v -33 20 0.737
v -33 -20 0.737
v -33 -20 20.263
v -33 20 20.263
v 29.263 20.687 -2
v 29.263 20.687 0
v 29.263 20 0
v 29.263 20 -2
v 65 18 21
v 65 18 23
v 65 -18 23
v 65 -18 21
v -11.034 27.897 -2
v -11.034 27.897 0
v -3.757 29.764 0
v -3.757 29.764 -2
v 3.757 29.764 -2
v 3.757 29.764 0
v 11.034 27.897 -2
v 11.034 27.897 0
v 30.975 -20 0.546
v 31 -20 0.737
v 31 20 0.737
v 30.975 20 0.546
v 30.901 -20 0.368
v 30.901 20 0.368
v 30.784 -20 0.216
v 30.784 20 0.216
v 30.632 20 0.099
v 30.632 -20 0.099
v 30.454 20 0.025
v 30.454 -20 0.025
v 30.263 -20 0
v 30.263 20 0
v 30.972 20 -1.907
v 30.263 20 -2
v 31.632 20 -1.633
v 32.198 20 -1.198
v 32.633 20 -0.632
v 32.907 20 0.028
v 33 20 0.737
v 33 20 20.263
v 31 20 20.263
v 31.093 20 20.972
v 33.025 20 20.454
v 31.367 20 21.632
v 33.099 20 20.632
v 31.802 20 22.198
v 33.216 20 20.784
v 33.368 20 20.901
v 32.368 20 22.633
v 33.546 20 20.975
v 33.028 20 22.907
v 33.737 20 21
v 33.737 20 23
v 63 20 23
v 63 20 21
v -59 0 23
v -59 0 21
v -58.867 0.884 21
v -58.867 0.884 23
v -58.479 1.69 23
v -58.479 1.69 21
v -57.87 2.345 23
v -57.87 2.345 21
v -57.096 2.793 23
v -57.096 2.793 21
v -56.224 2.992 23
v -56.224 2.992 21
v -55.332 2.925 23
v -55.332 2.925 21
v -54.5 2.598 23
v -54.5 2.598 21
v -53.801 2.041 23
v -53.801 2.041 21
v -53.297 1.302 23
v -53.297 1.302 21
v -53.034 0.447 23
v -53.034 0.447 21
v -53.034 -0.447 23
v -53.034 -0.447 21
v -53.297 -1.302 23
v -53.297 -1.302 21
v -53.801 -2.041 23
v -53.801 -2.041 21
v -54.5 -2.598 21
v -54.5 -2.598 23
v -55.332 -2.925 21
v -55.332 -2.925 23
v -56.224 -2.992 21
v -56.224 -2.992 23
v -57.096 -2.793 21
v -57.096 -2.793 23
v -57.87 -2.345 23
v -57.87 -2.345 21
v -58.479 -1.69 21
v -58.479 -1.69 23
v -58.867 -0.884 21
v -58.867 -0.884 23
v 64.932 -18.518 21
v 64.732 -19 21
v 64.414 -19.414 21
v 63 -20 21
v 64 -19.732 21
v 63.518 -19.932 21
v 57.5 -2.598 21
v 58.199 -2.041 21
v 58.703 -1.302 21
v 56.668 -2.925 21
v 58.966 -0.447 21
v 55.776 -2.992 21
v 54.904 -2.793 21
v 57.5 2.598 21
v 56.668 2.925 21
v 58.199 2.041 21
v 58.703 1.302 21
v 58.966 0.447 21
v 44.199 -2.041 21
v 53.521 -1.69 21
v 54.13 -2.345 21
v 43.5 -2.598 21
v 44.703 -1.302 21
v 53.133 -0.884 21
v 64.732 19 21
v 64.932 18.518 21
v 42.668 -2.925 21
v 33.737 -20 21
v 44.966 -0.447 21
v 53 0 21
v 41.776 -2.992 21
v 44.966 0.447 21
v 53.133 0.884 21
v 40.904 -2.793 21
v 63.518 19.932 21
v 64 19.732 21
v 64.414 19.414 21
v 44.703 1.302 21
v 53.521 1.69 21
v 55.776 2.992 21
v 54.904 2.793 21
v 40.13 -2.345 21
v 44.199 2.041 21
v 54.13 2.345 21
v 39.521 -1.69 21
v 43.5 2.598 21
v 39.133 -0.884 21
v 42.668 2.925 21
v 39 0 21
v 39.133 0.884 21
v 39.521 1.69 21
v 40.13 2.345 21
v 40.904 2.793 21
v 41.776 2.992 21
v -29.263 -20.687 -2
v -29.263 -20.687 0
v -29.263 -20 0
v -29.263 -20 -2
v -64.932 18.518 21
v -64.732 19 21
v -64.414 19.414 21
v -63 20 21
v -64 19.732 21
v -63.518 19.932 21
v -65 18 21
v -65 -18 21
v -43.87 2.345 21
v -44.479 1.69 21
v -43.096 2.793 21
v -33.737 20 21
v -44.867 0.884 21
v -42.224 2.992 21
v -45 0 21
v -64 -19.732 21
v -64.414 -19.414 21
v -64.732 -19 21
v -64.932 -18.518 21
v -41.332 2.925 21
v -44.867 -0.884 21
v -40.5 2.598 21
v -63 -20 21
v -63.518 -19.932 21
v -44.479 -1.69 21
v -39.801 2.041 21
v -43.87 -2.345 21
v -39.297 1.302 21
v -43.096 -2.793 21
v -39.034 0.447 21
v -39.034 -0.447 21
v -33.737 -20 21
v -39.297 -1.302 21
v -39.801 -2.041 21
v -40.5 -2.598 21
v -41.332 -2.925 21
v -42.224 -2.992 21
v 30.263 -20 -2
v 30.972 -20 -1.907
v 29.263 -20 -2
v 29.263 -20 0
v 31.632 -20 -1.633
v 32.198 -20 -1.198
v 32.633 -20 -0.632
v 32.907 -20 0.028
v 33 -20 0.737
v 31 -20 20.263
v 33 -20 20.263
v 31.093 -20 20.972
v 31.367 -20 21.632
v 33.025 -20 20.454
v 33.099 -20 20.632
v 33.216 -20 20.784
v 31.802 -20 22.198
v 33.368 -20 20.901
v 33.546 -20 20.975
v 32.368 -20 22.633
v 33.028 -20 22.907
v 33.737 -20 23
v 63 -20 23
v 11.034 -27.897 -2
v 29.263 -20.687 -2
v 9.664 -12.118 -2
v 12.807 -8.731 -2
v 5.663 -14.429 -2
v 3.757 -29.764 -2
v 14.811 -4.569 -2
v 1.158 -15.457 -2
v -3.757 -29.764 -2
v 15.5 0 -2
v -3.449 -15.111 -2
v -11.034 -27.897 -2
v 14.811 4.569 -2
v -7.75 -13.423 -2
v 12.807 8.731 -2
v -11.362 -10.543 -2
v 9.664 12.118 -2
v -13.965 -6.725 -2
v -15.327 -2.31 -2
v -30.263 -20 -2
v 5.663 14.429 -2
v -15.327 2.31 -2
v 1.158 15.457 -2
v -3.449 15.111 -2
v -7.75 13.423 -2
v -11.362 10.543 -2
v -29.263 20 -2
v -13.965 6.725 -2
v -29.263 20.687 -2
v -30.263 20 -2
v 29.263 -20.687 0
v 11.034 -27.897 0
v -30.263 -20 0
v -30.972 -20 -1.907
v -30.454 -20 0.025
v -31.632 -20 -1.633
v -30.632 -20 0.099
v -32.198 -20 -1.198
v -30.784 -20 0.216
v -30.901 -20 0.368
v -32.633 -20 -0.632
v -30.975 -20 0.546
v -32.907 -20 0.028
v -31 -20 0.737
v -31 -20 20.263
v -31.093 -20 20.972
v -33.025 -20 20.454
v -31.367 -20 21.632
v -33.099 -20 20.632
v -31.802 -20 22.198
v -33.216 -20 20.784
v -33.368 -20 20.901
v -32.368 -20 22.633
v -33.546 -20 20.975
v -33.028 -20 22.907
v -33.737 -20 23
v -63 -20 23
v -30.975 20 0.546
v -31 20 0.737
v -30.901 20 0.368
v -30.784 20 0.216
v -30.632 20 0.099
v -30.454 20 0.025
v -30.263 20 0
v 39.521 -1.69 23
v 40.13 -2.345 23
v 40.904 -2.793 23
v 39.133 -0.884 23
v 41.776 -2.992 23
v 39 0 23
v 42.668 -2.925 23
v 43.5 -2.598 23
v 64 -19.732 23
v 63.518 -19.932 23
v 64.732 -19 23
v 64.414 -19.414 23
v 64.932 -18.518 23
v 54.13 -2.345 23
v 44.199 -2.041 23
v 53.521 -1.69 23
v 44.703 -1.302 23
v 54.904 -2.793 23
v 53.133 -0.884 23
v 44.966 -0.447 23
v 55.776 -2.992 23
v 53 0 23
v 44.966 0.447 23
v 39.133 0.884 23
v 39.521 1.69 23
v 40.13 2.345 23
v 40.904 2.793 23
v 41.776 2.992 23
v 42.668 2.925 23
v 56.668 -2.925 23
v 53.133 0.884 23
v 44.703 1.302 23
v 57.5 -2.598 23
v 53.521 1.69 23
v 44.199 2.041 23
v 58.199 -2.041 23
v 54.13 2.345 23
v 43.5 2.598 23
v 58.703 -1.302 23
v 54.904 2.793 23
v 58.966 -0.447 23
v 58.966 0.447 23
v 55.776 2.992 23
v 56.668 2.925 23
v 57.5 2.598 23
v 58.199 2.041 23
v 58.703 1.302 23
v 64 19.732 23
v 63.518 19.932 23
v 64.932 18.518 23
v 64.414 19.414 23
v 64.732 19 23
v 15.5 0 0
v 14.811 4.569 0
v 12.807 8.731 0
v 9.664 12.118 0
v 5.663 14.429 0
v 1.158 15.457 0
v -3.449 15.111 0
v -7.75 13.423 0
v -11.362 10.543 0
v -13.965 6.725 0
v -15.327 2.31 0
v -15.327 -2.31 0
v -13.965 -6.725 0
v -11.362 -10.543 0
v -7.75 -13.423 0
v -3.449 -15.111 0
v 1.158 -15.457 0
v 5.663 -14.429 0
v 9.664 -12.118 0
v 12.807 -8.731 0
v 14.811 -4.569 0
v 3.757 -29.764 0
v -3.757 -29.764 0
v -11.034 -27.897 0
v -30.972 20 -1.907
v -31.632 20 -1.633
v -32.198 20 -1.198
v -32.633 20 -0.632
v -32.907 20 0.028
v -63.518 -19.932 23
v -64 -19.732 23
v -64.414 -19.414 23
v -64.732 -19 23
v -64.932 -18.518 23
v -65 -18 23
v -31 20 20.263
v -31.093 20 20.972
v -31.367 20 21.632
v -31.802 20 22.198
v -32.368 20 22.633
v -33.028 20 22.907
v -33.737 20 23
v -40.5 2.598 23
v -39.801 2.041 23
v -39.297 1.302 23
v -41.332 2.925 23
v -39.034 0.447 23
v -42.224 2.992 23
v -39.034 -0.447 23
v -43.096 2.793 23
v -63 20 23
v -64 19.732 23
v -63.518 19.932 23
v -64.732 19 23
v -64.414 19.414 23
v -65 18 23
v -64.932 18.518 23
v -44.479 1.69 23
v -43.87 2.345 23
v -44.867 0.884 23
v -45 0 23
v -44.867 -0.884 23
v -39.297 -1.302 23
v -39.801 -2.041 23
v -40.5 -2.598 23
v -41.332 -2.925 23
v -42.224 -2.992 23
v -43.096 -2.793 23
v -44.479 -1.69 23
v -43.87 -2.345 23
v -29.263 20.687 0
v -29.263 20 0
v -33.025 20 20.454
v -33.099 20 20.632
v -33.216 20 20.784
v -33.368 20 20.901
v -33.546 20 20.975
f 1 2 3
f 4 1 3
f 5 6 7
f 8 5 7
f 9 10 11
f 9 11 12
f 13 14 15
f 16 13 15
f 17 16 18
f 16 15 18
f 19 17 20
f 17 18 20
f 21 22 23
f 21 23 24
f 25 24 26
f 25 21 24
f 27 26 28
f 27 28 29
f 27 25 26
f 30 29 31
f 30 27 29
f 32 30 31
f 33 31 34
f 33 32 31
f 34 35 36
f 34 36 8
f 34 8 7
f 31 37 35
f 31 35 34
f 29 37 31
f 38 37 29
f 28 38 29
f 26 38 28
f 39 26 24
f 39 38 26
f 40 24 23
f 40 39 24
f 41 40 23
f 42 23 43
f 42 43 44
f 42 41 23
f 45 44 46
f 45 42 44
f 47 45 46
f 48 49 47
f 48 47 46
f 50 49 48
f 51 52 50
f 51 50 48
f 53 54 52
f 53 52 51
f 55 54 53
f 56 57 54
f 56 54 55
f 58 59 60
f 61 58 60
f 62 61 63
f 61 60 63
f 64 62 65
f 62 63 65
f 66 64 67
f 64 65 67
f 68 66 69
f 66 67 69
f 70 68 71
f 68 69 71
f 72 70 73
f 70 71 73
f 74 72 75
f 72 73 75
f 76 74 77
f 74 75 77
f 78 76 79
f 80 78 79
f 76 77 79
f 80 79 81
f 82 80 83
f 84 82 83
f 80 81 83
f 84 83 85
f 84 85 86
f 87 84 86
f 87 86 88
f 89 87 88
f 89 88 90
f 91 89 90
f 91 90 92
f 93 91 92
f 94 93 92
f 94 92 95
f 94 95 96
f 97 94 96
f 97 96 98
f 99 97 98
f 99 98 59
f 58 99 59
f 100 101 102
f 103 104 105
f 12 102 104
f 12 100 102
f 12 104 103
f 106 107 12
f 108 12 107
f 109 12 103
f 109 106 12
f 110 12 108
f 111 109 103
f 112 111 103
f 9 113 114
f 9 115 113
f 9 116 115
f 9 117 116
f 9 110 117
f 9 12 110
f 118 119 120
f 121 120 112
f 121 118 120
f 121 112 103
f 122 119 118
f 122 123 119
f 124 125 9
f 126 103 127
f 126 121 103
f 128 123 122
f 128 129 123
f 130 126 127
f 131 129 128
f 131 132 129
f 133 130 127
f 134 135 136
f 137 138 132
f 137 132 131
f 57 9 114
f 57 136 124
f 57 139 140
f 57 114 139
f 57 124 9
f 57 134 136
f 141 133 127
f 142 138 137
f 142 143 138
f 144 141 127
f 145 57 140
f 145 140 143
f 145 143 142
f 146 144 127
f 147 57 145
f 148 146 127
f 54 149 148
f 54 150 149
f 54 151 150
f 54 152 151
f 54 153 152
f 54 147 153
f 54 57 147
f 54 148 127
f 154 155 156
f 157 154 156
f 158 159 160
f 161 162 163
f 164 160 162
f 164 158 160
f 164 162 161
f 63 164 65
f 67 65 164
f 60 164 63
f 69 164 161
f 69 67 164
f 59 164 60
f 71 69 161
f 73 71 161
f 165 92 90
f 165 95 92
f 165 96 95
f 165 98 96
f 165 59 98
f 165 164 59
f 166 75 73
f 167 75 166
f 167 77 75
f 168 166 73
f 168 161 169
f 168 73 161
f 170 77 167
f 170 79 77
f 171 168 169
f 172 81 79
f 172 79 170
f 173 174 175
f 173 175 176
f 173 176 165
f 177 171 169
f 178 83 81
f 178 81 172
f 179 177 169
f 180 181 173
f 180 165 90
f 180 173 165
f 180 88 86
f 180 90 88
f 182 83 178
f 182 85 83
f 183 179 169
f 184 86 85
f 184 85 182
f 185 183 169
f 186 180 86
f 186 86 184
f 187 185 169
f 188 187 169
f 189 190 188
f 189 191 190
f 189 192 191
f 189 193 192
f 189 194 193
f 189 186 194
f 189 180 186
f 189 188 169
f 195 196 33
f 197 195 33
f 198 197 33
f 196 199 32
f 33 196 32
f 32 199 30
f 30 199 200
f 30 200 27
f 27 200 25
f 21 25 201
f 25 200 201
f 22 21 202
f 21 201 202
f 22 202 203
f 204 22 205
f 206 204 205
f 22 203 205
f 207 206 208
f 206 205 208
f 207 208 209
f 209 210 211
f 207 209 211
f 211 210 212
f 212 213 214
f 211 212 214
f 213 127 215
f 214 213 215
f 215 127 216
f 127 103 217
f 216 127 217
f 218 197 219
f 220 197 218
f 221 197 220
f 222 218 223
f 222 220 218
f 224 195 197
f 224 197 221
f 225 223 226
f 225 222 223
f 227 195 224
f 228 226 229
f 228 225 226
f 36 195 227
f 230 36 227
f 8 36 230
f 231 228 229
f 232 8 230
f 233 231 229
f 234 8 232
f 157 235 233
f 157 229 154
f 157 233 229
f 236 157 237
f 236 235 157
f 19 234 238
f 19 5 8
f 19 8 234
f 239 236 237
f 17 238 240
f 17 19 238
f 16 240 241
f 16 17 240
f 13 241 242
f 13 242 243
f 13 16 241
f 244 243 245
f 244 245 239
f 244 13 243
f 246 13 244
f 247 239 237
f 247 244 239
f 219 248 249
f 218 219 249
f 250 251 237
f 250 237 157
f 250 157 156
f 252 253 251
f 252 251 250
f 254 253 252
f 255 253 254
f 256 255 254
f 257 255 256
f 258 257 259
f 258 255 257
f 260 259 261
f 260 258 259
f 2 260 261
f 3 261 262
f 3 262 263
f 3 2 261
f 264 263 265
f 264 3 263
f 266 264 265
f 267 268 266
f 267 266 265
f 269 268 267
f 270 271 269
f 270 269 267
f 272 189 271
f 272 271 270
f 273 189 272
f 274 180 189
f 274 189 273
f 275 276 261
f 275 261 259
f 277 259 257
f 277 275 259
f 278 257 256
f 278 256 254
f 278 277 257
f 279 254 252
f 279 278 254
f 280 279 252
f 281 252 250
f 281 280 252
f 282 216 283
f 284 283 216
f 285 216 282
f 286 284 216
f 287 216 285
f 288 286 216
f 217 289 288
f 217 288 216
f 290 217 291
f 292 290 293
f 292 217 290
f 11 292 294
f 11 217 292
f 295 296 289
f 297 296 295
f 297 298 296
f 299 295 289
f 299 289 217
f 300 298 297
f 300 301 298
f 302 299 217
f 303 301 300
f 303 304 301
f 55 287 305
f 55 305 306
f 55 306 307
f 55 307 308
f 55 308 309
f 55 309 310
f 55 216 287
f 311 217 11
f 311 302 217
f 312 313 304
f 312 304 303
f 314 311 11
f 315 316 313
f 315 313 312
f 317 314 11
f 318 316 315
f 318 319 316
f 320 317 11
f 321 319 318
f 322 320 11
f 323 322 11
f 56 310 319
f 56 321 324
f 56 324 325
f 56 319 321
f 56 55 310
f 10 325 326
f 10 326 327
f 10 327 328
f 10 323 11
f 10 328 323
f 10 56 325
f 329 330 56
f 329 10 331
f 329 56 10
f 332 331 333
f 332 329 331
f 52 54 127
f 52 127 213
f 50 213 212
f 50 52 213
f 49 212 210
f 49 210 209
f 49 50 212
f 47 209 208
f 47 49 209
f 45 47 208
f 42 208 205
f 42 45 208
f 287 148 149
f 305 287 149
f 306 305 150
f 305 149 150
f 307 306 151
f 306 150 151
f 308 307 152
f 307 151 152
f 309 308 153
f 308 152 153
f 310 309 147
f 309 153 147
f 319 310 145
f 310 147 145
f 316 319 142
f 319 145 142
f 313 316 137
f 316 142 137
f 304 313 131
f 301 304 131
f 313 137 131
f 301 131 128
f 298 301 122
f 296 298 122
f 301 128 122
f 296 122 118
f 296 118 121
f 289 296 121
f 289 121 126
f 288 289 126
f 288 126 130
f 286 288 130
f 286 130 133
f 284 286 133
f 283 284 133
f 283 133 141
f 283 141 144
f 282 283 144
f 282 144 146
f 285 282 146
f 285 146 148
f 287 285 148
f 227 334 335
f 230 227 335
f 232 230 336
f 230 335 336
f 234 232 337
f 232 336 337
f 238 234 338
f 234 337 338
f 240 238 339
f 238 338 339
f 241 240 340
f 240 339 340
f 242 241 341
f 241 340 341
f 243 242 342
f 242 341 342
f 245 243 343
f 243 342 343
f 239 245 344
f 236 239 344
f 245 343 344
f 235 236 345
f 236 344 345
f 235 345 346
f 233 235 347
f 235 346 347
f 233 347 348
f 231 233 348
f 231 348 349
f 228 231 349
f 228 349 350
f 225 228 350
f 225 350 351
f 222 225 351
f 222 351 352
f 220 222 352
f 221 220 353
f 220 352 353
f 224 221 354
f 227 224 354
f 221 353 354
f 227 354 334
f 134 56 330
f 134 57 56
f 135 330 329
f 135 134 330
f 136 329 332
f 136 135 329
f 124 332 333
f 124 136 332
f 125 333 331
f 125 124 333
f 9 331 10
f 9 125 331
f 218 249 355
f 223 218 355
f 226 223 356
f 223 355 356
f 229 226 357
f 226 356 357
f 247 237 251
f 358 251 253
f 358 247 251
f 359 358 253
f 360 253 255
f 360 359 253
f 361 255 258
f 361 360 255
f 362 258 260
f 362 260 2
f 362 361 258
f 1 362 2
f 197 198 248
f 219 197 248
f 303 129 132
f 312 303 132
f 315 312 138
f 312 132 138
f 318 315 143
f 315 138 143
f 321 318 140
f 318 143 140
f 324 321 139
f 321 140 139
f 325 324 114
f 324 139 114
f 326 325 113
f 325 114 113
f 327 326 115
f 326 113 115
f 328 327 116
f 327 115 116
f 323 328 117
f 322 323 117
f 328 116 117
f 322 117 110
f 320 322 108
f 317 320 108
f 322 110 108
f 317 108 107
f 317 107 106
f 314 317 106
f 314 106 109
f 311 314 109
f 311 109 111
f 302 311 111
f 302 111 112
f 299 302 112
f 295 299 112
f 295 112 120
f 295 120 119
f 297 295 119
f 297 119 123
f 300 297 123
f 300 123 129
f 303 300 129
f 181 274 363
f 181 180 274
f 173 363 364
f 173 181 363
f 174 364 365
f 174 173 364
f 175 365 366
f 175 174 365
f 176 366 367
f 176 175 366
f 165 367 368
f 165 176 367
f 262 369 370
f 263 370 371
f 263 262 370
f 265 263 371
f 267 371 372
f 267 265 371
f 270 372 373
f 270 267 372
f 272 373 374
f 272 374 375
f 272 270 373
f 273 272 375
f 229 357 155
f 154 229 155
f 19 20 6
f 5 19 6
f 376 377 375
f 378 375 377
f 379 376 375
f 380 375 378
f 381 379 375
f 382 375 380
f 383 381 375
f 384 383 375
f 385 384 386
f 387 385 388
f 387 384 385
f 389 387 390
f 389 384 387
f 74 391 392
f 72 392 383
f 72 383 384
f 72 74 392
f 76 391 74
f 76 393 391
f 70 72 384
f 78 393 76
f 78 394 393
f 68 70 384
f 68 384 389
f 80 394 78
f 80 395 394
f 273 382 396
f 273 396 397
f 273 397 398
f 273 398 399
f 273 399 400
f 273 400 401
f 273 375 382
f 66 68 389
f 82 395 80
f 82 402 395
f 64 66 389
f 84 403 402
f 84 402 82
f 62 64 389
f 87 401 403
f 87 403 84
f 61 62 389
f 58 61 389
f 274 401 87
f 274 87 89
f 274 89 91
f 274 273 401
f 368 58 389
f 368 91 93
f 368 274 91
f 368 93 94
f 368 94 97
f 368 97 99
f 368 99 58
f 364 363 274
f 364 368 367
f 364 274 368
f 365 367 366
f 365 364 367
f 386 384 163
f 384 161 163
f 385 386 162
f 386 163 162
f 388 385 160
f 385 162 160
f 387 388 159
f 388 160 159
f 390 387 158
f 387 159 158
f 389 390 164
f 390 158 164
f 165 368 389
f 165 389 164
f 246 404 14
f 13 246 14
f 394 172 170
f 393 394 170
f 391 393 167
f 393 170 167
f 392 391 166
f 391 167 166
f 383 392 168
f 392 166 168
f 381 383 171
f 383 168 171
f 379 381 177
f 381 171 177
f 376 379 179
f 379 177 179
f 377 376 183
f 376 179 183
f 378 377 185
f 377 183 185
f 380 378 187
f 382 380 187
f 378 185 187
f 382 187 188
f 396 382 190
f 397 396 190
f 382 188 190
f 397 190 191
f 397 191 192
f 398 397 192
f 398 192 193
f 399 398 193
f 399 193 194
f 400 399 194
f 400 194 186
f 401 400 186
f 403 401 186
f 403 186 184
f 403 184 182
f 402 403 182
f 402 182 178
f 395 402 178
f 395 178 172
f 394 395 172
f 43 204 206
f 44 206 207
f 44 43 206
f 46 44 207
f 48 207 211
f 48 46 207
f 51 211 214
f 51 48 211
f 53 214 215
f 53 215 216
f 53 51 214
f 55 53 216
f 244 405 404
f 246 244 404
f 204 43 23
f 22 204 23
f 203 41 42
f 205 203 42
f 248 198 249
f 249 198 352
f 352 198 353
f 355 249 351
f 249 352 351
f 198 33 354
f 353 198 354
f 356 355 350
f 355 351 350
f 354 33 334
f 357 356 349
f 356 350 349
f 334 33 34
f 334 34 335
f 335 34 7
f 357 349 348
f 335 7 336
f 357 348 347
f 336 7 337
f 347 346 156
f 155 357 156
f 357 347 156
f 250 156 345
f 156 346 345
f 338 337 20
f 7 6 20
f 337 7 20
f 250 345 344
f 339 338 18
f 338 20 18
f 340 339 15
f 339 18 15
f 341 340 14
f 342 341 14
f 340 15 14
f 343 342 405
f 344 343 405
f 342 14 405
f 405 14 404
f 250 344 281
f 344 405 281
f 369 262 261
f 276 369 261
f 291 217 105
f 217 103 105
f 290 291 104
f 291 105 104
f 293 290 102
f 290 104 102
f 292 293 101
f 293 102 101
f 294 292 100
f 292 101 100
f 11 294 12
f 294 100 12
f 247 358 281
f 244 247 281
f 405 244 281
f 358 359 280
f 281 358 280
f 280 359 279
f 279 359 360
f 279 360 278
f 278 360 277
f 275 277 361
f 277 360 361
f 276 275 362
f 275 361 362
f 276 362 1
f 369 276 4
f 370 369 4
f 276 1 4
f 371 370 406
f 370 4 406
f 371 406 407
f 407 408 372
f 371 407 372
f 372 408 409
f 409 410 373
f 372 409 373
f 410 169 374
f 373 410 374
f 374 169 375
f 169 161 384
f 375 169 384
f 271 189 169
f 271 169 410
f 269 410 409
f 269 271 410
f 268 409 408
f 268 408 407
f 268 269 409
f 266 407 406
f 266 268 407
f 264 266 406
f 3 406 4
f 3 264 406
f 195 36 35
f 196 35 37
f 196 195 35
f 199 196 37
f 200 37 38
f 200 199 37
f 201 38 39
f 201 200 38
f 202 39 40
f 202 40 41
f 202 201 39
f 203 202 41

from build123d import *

# Parameters (mm, degrees)
SKETCH1_R                       = 15.5
BASE_FLANGE1_DEPTH              = 2
EDGE_FLANGE1_STRIP_W            = 9.4732
EDGE_FLANGE1_STRIP_H            = 2
EDGE_FLANGE1_STRIP_CUT_DEPTH    = 40
EDGE_FLANGE1_RELIEF_W           = 10.4732
EDGE_FLANGE1_RELIEF_H           = 1
EDGE_FLANGE1_RELIEF_CUT_DEPTH   = 2
EDGE_FLANGE1_STRIP_2_W          = 9.4732
EDGE_FLANGE1_STRIP_2_H          = 2
EDGE_FLANGE1_STRIP_CUT_2_DEPTH  = 40
EDGE_FLANGE1_RELIEF_2_W         = 10.4732
EDGE_FLANGE1_RELIEF_2_H         = 1
EDGE_FLANGE1_RELIEF_CUT_2_DEPTH = 2
EDGE_FLANGE1_DEPTH              = 40
EDGE_FLANGE1_BEND_DEPTH         = 40
EDGE_FLANGE2_STRIP_W            = 9.4732
EDGE_FLANGE2_STRIP_H            = 2
EDGE_FLANGE2_STRIP_CUT_DEPTH    = 40
EDGE_FLANGE2_STRIP_2_W          = 9.4732
EDGE_FLANGE2_STRIP_2_H          = 2
EDGE_FLANGE2_STRIP_CUT_2_DEPTH  = 40
EDGE_FLANGE2_DEPTH              = 40
EDGE_FLANGE2_BEND_DEPTH         = 40
SKETCH17_R                      = 3
CUT_EXTRUDE1_DEPTH              = 10
FILLET1_R                       = 2


# Sheet-metal steps are written as plain solids
with BuildPart() as part:
    # Sketch1 → Base-Flange1 (new body)
    with BuildSketch(Plane.XY):
        with BuildLine():
            Line((-31, 20), (-11.034132012, 27.897095382))
            ThreePointArc((-11.034132012, 27.897095382), (0, 30), (11.034132012, 27.897095382))
            Line((11.034132012, 27.897095382), (31, 20))
            Line((31, 20), (31, -20))
            Line((31, -20), (11.034132012, -27.897095382))
            ThreePointArc((11.034132012, -27.897095382), (0, -30), (-11.034132012, -27.897095382))
            Line((-11.034132012, -27.897095382), (-31, -20))
            Line((-31, -20), (-31, 20))
        make_face()
        Circle(SKETCH1_R, mode=Mode.SUBTRACT)
    extrude(amount=-BASE_FLANGE1_DEPTH)

    # Edge-Flange1 strip (across the edge) → Edge-Flange1 strip cut (cut)
    with BuildSketch(Plane(origin=(-31, 20, 0), x_dir=(1, 0, 0), z_dir=(0, -1, 0))):
        with Locations((-4, -1)):
            Rectangle(EDGE_FLANGE1_STRIP_W, EDGE_FLANGE1_STRIP_H)
    extrude(amount=EDGE_FLANGE1_STRIP_CUT_DEPTH, mode=Mode.SUBTRACT)

    # Edge-Flange1 relief (on the sheet) → Edge-Flange1 relief cut (cut)
    with BuildSketch(Plane(origin=(-30.2634, 20, 0), x_dir=(1, 0, 0), z_dir=(0, 0, 1))):
        with Locations((-4.2366, 0.5)):
            Rectangle(EDGE_FLANGE1_RELIEF_W, EDGE_FLANGE1_RELIEF_H)
        with Locations((-4.2366, -40.5)):
            Rectangle(EDGE_FLANGE1_RELIEF_W, EDGE_FLANGE1_RELIEF_H)
    extrude(amount=-EDGE_FLANGE1_RELIEF_CUT_DEPTH, mode=Mode.SUBTRACT)

    # Edge-Flange1 strip 2 (across the edge) → Edge-Flange1 strip cut 2 (cut)
    with BuildSketch(Plane(origin=(31, -20, 0), x_dir=(-1, 0, 0), z_dir=(0, 1, 0))):
        with Locations((-4, -1)):
            Rectangle(EDGE_FLANGE1_STRIP_2_W, EDGE_FLANGE1_STRIP_2_H)
    extrude(amount=EDGE_FLANGE1_STRIP_CUT_2_DEPTH, mode=Mode.SUBTRACT)

    # Edge-Flange1 relief 2 (on the sheet) → Edge-Flange1 relief cut 2 (cut)
    with BuildSketch(Plane(origin=(30.2634, -20, 0), x_dir=(-1, 0, 0), z_dir=(0, 0, 1))):
        with Locations((-4.2366, 0.5)):
            Rectangle(EDGE_FLANGE1_RELIEF_2_W, EDGE_FLANGE1_RELIEF_2_H)
        with Locations((-4.2366, -40.5)):
            Rectangle(EDGE_FLANGE1_RELIEF_2_W, EDGE_FLANGE1_RELIEF_2_H)
    extrude(amount=-EDGE_FLANGE1_RELIEF_CUT_2_DEPTH, mode=Mode.SUBTRACT)

    # Edge-Flange1 section (across the edge) → Edge-Flange1 (add)
    with BuildSketch(Plane(origin=(-31, 20, 0), x_dir=(1, 0, 0), z_dir=(0, -1, 0))):
        with BuildLine():
            Line((-2, 0.7366), (-2, 21))
            Line((-2, 21), (0, 21))
            Line((0, 21), (0, 0.7366))
            ThreePointArc((0, 0.7366), (0.215745145, 0.215745145), (0.7366, 0))
            Line((0.7366, 0), (0.7366, -2))
            ThreePointArc((0.7366, -2), (-1.198468417, -1.198468417), (-2, 0.7366))
        make_face()
    extrude(amount=EDGE_FLANGE1_DEPTH)

    # Edge-Flange1 section 2 (across the edge) → Edge-Flange1 bend (add)
    with BuildSketch(Plane(origin=(31, -20, 0), x_dir=(-1, 0, 0), z_dir=(0, 1, 0))):
        with BuildLine():
            Line((-2, 0.7366), (-2, 21))
            Line((-2, 21), (0, 21))
            Line((0, 21), (0, 0.7366))
            ThreePointArc((0, 0.7366), (0.215745145, 0.215745145), (0.7366, 0))
            Line((0.7366, 0), (0.7366, -2))
            ThreePointArc((0.7366, -2), (-1.198468417, -1.198468417), (-2, 0.7366))
        make_face()
    extrude(amount=EDGE_FLANGE1_BEND_DEPTH)

    # Edge-Flange2 strip (across the edge) → Edge-Flange2 strip cut (cut)
    with BuildSketch(Plane(origin=(-33, -20, 21), x_dir=(0, 0, -1), z_dir=(0, 1, 0))):
        with Locations((-4, -1)):
            Rectangle(EDGE_FLANGE2_STRIP_W, EDGE_FLANGE2_STRIP_H)
    extrude(amount=EDGE_FLANGE2_STRIP_CUT_DEPTH, mode=Mode.SUBTRACT)

    # Edge-Flange2 strip 2 (across the edge) → Edge-Flange2 strip cut 2 (cut)
    with BuildSketch(Plane(origin=(33, 20, 21), x_dir=(0, 0, -1), z_dir=(0, -1, 0))):
        with Locations((-4, -1)):
            Rectangle(EDGE_FLANGE2_STRIP_2_W, EDGE_FLANGE2_STRIP_2_H)
    extrude(amount=EDGE_FLANGE2_STRIP_CUT_2_DEPTH, mode=Mode.SUBTRACT)

    # Edge-Flange2 section (across the edge) → Edge-Flange2 (add)
    with BuildSketch(Plane(origin=(-33, -20, 21), x_dir=(0, 0, -1), z_dir=(0, 1, 0))):
        with BuildLine():
            Line((-2, 0.7366), (-2, 32))
            Line((-2, 32), (0, 32))
            Line((0, 32), (0, 0.7366))
            ThreePointArc((0, 0.7366), (0.215745145, 0.215745145), (0.7366, 0))
            Line((0.7366, 0), (0.7366, -2))
            ThreePointArc((0.7366, -2), (-1.198468417, -1.198468417), (-2, 0.7366))
        make_face()
    extrude(amount=EDGE_FLANGE2_DEPTH)

    # Edge-Flange2 section 2 (across the edge) → Edge-Flange2 bend (add)
    with BuildSketch(Plane(origin=(33, 20, 21), x_dir=(0, 0, -1), z_dir=(0, -1, 0))):
        with BuildLine():
            Line((-2, 0.7366), (-2, 32))
            Line((-2, 32), (0, 32))
            Line((0, 32), (0, 0.7366))
            ThreePointArc((0, 0.7366), (0.215745145, 0.215745145), (0.7366, 0))
            Line((0.7366, 0), (0.7366, -2))
            ThreePointArc((0.7366, -2), (-1.198468417, -1.198468417), (-2, 0.7366))
        make_face()
    extrude(amount=EDGE_FLANGE2_BEND_DEPTH)

    # Sketch17 → Cut-Extrude1 (cut)
    with BuildSketch(Plane(origin=(0, 0, 21), x_dir=(-1, 0, 0), z_dir=(0, 0, -1))):
        with Locations((56, 0)):
            Circle(SKETCH17_R)
        with Locations((42, 0)):
            Circle(SKETCH17_R)
        with Locations((-56, 0)):
            Circle(SKETCH17_R)
        with Locations((-42, 0)):
            Circle(SKETCH17_R)
    extrude(amount=-CUT_EXTRUDE1_DEPTH, mode=Mode.SUBTRACT)

    # Fillet1
    fillet1_edges = [part.edges().sort_by_distance(p)[0] for p in [
        (-65, -20, 22),
        (-65, 20, 22),
        (65, 20, 22),
        (65, -20, 22),
    ]]
    fillet(fillet1_edges, radius=FILLET1_R)


solid = part.part
